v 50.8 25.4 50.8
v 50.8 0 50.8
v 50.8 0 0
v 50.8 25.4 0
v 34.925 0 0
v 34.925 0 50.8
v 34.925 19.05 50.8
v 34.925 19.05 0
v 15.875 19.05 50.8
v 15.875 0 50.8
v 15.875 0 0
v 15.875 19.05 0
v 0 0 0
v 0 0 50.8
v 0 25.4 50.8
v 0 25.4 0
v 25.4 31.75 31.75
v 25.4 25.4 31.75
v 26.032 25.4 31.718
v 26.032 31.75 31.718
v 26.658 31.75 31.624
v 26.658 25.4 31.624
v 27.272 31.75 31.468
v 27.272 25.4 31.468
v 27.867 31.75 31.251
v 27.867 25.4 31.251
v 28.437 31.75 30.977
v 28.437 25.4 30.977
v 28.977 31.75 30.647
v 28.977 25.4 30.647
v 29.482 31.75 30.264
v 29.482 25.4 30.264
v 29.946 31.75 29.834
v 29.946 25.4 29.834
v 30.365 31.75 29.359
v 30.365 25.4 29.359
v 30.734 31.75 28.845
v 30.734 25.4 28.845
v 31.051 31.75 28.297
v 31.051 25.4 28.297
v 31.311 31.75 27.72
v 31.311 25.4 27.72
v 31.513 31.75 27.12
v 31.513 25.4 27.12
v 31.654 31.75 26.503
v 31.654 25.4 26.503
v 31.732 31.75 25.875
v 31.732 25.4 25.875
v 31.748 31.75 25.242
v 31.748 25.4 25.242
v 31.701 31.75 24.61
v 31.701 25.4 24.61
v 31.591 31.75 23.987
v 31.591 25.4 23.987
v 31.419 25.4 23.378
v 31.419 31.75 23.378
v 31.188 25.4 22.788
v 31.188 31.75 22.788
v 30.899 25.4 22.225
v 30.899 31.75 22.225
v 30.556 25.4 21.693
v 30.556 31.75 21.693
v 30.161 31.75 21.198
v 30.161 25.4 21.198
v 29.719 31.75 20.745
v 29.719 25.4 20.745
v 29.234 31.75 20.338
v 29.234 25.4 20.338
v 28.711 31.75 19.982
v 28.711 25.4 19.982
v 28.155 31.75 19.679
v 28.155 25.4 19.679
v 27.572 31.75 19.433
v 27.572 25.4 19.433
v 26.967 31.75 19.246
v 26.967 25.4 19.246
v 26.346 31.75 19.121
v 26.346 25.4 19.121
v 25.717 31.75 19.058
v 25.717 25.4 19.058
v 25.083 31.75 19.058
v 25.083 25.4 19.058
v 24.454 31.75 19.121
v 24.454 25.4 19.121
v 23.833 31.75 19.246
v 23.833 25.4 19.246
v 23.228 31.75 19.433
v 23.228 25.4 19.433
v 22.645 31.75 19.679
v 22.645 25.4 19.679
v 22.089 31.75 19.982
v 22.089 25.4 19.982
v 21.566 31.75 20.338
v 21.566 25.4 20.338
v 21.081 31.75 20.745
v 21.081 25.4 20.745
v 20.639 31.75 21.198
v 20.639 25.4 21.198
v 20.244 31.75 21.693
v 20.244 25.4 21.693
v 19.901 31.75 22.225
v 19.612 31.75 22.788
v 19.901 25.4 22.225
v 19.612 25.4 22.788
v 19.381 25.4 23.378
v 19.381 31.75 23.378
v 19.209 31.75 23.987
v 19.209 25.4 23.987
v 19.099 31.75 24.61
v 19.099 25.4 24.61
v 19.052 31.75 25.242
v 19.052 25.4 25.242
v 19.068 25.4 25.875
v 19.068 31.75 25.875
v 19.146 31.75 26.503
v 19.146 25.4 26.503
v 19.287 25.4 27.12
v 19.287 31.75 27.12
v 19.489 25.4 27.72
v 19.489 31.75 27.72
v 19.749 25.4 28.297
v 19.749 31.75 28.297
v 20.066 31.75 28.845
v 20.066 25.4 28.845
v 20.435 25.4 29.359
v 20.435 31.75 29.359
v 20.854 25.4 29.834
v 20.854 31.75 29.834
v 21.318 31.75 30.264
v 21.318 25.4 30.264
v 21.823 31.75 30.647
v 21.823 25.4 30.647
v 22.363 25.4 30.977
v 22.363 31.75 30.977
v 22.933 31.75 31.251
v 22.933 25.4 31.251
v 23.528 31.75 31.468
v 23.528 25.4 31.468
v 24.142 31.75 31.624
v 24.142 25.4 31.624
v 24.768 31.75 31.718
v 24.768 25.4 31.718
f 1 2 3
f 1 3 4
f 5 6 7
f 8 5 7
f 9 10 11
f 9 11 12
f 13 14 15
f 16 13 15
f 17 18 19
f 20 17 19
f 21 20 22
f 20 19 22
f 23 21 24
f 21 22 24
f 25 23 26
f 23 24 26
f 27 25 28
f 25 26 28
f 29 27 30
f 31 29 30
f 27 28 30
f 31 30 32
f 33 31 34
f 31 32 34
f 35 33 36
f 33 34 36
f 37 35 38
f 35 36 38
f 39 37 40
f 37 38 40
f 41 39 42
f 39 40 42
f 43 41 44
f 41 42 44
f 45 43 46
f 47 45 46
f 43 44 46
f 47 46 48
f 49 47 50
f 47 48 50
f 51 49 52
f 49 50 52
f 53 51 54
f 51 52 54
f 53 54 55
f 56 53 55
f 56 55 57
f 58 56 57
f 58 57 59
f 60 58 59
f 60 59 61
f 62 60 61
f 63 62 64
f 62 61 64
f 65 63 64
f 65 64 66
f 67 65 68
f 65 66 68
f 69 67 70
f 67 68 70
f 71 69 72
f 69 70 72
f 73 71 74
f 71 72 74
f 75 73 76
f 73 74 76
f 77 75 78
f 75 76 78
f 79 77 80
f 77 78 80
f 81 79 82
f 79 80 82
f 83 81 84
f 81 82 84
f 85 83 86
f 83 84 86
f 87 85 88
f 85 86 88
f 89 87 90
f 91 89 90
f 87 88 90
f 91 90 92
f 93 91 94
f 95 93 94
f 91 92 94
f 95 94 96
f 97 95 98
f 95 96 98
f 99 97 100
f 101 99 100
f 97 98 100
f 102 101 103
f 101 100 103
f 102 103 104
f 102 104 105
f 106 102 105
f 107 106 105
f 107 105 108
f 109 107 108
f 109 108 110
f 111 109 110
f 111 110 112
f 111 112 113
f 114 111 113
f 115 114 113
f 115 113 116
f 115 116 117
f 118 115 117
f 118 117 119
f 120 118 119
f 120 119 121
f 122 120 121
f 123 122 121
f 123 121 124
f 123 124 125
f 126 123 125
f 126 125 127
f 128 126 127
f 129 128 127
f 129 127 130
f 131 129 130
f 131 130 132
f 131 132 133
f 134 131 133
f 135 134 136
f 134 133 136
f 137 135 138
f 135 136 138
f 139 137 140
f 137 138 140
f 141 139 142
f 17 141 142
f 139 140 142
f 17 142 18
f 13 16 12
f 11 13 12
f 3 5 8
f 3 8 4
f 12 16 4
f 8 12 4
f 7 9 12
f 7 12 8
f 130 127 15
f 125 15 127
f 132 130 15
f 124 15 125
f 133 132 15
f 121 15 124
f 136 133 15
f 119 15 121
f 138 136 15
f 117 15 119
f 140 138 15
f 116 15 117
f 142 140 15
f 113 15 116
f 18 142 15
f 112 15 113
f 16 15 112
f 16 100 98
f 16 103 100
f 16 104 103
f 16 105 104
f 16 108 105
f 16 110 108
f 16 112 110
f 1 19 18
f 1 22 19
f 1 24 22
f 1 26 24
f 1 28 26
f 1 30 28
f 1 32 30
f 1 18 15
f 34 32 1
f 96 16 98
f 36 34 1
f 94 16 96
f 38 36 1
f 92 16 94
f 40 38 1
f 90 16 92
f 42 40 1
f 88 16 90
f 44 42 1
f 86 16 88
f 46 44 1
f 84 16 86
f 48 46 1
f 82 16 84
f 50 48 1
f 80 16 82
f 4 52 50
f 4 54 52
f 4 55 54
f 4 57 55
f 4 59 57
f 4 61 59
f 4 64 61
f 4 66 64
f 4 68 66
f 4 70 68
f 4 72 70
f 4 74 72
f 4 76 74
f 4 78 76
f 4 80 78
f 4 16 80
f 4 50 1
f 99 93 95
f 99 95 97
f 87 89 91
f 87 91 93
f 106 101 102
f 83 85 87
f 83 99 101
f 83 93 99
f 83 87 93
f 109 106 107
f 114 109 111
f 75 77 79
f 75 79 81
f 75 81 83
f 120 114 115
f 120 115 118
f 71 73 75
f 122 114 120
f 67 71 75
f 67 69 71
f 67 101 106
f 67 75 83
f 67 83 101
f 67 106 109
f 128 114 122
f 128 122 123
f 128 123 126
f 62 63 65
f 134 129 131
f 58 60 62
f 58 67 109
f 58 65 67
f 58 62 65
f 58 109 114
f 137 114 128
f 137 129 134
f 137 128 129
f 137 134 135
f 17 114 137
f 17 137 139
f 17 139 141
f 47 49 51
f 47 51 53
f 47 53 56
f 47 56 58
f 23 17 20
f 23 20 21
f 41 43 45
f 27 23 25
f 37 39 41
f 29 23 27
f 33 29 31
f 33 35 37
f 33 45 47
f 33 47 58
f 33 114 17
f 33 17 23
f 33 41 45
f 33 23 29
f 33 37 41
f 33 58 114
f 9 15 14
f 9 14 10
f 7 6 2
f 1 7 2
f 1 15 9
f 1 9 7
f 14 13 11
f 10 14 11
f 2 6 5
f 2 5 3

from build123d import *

# Parameters (mm, degrees)
SKETCH1_W           = 50.8
SKETCH1_H           = 25.4
BOSS_EXTRUDE1_DEPTH = 50.8
SKETCH2_W           = 19.05
SKETCH2_H           = 19.05
CUT_EXTRUDE1_DEPTH  = 50.8
SKETCH3_R           = 6.35
BOSS_EXTRUDE2_DEPTH = 6.35


with BuildPart() as part:
    # Sketch1 → Boss-Extrude1 (new body)
    with BuildSketch(Plane.XY):
        with Locations((25.4, 12.7)):
            Rectangle(SKETCH1_W, SKETCH1_H)
    extrude(amount=BOSS_EXTRUDE1_DEPTH)

    # Sketch2 → Cut-Extrude1 (cut)
    with BuildSketch(Plane.XY.offset(50.8)):
        with Locations((25.4, 9.525)):
            Rectangle(SKETCH2_W, SKETCH2_H)
    extrude(amount=-CUT_EXTRUDE1_DEPTH, mode=Mode.SUBTRACT)

    # Sketch3 → Boss-Extrude2 (add)
    with BuildSketch(Plane(origin=(0, 25.4, 0), x_dir=(1, 0, 0), z_dir=(0, 1, 0))):
        with Locations(Location((25.4, -25.4, 0), (0, 0, 270))):
            Circle(SKETCH3_R)
    extrude(amount=BOSS_EXTRUDE2_DEPTH)


solid = part.part
